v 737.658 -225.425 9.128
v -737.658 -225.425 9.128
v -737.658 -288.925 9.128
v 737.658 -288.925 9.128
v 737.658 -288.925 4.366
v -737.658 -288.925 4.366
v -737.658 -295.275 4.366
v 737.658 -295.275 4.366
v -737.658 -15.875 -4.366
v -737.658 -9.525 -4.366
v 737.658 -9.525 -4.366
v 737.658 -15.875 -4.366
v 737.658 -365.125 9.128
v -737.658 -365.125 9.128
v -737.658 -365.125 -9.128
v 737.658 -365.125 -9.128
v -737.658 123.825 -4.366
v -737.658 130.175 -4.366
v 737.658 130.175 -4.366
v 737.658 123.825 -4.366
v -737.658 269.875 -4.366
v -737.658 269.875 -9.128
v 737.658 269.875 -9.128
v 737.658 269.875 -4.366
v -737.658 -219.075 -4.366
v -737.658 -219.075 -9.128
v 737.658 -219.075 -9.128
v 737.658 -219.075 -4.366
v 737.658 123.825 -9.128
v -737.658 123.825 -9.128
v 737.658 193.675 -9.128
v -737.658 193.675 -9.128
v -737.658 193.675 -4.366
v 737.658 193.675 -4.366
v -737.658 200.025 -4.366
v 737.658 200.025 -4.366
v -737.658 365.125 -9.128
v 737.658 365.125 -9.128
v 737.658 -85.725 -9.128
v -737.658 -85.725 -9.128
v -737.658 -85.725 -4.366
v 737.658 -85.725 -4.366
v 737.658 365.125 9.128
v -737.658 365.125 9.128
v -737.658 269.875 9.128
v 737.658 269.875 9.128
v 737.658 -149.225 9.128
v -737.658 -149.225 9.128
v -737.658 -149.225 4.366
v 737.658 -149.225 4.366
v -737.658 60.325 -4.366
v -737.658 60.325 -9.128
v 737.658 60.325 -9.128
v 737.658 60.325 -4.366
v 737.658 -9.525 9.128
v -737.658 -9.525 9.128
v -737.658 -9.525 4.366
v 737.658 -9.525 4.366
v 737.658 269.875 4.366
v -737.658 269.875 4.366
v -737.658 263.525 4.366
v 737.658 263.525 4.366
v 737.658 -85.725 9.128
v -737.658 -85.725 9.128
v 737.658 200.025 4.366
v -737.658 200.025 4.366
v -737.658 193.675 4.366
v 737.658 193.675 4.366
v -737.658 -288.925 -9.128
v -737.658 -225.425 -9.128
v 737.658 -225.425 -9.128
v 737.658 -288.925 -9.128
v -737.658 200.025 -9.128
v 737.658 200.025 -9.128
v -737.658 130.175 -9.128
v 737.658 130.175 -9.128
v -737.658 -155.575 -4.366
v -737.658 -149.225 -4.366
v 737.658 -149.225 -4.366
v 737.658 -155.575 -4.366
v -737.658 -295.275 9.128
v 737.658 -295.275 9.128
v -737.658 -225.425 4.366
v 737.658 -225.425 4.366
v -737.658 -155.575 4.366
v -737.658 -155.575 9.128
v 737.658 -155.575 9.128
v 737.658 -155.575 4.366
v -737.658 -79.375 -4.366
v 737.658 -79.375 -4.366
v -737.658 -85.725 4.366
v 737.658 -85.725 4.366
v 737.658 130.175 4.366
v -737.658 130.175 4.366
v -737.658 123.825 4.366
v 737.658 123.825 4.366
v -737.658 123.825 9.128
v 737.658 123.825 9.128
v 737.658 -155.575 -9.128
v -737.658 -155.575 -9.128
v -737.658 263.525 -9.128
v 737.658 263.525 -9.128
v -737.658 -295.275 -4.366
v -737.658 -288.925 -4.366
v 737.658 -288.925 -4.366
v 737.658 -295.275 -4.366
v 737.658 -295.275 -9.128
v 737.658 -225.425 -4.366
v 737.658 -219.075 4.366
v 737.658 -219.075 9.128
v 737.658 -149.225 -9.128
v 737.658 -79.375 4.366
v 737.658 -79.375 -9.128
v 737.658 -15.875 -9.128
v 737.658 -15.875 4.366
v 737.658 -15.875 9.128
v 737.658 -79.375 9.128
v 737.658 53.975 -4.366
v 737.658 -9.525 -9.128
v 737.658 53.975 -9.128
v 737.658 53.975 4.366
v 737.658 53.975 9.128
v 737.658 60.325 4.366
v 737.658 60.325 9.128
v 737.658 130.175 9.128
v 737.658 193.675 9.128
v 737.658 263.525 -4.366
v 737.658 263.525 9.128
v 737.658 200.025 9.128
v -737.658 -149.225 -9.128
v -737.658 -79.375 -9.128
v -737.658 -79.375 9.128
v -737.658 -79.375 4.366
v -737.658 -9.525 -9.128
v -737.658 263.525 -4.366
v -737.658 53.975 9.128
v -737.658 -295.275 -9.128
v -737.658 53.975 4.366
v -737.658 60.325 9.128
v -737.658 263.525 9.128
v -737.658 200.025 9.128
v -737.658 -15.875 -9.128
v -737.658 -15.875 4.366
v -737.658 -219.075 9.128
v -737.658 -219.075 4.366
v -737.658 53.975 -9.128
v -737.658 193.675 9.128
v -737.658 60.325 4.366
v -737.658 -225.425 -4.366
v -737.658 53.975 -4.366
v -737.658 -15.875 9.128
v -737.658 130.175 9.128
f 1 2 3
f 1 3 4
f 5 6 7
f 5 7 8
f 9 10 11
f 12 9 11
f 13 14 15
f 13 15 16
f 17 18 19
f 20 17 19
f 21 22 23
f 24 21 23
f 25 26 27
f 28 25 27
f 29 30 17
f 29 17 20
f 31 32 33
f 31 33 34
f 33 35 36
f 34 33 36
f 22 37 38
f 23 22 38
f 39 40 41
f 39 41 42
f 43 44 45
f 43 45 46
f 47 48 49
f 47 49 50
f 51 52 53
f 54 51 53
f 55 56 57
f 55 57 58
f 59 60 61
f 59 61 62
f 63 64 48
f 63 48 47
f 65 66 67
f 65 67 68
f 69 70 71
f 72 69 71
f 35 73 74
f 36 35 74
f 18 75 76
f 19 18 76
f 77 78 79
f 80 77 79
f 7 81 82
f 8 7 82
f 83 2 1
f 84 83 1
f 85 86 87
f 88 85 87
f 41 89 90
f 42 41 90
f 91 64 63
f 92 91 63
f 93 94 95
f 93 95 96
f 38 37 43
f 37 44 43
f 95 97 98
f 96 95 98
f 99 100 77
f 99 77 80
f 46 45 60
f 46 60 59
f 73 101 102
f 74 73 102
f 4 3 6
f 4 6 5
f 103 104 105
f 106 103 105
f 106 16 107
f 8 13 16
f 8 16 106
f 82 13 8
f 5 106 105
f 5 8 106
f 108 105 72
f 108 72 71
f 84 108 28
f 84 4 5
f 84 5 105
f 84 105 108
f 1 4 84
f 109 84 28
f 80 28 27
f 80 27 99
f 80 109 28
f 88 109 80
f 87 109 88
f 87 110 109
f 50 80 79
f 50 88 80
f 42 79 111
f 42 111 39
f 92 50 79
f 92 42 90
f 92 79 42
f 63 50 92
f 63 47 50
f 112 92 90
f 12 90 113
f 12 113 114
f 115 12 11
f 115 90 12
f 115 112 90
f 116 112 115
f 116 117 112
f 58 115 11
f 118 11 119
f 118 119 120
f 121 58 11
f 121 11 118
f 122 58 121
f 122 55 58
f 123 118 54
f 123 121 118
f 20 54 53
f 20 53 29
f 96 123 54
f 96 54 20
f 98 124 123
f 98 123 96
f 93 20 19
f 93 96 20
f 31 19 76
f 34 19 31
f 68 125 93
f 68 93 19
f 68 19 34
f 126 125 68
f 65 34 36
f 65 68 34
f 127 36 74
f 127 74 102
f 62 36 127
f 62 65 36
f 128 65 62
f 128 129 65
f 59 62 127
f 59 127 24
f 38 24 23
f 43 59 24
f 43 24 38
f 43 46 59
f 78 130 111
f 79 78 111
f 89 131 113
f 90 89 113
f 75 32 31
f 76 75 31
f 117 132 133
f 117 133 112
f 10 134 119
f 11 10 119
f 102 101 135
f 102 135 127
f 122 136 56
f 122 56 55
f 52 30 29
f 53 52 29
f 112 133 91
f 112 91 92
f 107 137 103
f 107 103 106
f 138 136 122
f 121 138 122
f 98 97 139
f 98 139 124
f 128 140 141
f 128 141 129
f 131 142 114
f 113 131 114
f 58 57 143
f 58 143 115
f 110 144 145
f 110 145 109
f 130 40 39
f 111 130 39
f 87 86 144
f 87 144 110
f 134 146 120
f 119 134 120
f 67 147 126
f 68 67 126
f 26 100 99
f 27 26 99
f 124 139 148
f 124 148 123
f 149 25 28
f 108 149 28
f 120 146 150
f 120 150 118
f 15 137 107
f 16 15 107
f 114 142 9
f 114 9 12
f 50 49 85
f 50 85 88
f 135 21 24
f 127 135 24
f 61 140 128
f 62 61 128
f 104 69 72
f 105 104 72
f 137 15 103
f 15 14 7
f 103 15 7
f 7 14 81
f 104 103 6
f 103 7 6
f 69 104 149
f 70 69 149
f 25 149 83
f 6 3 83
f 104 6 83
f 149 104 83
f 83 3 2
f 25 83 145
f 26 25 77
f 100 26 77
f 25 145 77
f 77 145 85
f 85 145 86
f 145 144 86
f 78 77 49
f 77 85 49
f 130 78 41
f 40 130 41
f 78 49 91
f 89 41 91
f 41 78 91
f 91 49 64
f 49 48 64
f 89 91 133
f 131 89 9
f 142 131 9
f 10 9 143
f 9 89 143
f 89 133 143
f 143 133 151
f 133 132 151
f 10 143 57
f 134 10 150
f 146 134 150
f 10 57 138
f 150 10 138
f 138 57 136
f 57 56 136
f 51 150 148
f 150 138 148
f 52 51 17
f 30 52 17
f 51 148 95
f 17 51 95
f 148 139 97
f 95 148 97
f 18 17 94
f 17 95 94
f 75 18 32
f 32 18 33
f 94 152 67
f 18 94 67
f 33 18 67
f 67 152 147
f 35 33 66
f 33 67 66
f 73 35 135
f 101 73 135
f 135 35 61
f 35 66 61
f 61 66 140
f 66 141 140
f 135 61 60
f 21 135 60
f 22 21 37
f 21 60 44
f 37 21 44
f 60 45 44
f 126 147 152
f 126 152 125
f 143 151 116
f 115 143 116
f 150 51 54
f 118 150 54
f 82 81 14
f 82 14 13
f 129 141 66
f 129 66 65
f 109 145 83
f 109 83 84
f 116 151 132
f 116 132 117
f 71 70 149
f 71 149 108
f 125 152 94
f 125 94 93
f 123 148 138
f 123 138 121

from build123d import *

# Parameters (mm, degrees)
SKETCH1_W                = 1475.316666666
SKETCH1_H                = 730.25
BOSS_EXTRUDE1_DEPTH      = 9.128125
BOSS_EXTRUDE1_DEPTH_BACK = 9.128125
SKETCH2_W                = 1475.316666666
SKETCH2_H                = 6.35
CUT_EXTRUDE1_DEPTH       = 4.7625


with BuildPart() as part:
    # Sketch1 → Boss-Extrude1 (new body, two sides)
    with BuildSketch(Plane.XY) as boss_extrude1_sk:
        Rectangle(SKETCH1_W, SKETCH1_H)
    extrude(amount=BOSS_EXTRUDE1_DEPTH)
    extrude(boss_extrude1_sk.sketch, amount=-BOSS_EXTRUDE1_DEPTH_BACK)

    # Sketch2 → Cut-Extrude1 (cut)
    with BuildSketch(Plane.XY.offset(9.128125)):
        with Locations((0, -292.1)):
            Rectangle(SKETCH2_W, SKETCH2_H)
        with Locations((0, -222.25)):
            Rectangle(SKETCH2_W, SKETCH2_H)
        with Locations((0, -152.4)):
            Rectangle(SKETCH2_W, SKETCH2_H)
        with Locations((0, -82.55)):
            Rectangle(SKETCH2_W, SKETCH2_H)
        with Locations((0, -12.7)):
            Rectangle(SKETCH2_W, SKETCH2_H)
        with Locations((0, 57.15)):
            Rectangle(SKETCH2_W, SKETCH2_H)
        with Locations((0, 127)):
            Rectangle(SKETCH2_W, SKETCH2_H)
        with Locations((0, 196.85)):
            Rectangle(SKETCH2_W, SKETCH2_H)
        with Locations((0, 266.7)):
            Rectangle(SKETCH2_W, SKETCH2_H)
    cut_extrude1 = extrude(amount=-CUT_EXTRUDE1_DEPTH, mode=Mode.SUBTRACT)

    # Mirror1: Cut-Extrude1 across plane
    add(cut_extrude1.mirror(Plane.XY), mode=Mode.SUBTRACT)


solid = part.part
